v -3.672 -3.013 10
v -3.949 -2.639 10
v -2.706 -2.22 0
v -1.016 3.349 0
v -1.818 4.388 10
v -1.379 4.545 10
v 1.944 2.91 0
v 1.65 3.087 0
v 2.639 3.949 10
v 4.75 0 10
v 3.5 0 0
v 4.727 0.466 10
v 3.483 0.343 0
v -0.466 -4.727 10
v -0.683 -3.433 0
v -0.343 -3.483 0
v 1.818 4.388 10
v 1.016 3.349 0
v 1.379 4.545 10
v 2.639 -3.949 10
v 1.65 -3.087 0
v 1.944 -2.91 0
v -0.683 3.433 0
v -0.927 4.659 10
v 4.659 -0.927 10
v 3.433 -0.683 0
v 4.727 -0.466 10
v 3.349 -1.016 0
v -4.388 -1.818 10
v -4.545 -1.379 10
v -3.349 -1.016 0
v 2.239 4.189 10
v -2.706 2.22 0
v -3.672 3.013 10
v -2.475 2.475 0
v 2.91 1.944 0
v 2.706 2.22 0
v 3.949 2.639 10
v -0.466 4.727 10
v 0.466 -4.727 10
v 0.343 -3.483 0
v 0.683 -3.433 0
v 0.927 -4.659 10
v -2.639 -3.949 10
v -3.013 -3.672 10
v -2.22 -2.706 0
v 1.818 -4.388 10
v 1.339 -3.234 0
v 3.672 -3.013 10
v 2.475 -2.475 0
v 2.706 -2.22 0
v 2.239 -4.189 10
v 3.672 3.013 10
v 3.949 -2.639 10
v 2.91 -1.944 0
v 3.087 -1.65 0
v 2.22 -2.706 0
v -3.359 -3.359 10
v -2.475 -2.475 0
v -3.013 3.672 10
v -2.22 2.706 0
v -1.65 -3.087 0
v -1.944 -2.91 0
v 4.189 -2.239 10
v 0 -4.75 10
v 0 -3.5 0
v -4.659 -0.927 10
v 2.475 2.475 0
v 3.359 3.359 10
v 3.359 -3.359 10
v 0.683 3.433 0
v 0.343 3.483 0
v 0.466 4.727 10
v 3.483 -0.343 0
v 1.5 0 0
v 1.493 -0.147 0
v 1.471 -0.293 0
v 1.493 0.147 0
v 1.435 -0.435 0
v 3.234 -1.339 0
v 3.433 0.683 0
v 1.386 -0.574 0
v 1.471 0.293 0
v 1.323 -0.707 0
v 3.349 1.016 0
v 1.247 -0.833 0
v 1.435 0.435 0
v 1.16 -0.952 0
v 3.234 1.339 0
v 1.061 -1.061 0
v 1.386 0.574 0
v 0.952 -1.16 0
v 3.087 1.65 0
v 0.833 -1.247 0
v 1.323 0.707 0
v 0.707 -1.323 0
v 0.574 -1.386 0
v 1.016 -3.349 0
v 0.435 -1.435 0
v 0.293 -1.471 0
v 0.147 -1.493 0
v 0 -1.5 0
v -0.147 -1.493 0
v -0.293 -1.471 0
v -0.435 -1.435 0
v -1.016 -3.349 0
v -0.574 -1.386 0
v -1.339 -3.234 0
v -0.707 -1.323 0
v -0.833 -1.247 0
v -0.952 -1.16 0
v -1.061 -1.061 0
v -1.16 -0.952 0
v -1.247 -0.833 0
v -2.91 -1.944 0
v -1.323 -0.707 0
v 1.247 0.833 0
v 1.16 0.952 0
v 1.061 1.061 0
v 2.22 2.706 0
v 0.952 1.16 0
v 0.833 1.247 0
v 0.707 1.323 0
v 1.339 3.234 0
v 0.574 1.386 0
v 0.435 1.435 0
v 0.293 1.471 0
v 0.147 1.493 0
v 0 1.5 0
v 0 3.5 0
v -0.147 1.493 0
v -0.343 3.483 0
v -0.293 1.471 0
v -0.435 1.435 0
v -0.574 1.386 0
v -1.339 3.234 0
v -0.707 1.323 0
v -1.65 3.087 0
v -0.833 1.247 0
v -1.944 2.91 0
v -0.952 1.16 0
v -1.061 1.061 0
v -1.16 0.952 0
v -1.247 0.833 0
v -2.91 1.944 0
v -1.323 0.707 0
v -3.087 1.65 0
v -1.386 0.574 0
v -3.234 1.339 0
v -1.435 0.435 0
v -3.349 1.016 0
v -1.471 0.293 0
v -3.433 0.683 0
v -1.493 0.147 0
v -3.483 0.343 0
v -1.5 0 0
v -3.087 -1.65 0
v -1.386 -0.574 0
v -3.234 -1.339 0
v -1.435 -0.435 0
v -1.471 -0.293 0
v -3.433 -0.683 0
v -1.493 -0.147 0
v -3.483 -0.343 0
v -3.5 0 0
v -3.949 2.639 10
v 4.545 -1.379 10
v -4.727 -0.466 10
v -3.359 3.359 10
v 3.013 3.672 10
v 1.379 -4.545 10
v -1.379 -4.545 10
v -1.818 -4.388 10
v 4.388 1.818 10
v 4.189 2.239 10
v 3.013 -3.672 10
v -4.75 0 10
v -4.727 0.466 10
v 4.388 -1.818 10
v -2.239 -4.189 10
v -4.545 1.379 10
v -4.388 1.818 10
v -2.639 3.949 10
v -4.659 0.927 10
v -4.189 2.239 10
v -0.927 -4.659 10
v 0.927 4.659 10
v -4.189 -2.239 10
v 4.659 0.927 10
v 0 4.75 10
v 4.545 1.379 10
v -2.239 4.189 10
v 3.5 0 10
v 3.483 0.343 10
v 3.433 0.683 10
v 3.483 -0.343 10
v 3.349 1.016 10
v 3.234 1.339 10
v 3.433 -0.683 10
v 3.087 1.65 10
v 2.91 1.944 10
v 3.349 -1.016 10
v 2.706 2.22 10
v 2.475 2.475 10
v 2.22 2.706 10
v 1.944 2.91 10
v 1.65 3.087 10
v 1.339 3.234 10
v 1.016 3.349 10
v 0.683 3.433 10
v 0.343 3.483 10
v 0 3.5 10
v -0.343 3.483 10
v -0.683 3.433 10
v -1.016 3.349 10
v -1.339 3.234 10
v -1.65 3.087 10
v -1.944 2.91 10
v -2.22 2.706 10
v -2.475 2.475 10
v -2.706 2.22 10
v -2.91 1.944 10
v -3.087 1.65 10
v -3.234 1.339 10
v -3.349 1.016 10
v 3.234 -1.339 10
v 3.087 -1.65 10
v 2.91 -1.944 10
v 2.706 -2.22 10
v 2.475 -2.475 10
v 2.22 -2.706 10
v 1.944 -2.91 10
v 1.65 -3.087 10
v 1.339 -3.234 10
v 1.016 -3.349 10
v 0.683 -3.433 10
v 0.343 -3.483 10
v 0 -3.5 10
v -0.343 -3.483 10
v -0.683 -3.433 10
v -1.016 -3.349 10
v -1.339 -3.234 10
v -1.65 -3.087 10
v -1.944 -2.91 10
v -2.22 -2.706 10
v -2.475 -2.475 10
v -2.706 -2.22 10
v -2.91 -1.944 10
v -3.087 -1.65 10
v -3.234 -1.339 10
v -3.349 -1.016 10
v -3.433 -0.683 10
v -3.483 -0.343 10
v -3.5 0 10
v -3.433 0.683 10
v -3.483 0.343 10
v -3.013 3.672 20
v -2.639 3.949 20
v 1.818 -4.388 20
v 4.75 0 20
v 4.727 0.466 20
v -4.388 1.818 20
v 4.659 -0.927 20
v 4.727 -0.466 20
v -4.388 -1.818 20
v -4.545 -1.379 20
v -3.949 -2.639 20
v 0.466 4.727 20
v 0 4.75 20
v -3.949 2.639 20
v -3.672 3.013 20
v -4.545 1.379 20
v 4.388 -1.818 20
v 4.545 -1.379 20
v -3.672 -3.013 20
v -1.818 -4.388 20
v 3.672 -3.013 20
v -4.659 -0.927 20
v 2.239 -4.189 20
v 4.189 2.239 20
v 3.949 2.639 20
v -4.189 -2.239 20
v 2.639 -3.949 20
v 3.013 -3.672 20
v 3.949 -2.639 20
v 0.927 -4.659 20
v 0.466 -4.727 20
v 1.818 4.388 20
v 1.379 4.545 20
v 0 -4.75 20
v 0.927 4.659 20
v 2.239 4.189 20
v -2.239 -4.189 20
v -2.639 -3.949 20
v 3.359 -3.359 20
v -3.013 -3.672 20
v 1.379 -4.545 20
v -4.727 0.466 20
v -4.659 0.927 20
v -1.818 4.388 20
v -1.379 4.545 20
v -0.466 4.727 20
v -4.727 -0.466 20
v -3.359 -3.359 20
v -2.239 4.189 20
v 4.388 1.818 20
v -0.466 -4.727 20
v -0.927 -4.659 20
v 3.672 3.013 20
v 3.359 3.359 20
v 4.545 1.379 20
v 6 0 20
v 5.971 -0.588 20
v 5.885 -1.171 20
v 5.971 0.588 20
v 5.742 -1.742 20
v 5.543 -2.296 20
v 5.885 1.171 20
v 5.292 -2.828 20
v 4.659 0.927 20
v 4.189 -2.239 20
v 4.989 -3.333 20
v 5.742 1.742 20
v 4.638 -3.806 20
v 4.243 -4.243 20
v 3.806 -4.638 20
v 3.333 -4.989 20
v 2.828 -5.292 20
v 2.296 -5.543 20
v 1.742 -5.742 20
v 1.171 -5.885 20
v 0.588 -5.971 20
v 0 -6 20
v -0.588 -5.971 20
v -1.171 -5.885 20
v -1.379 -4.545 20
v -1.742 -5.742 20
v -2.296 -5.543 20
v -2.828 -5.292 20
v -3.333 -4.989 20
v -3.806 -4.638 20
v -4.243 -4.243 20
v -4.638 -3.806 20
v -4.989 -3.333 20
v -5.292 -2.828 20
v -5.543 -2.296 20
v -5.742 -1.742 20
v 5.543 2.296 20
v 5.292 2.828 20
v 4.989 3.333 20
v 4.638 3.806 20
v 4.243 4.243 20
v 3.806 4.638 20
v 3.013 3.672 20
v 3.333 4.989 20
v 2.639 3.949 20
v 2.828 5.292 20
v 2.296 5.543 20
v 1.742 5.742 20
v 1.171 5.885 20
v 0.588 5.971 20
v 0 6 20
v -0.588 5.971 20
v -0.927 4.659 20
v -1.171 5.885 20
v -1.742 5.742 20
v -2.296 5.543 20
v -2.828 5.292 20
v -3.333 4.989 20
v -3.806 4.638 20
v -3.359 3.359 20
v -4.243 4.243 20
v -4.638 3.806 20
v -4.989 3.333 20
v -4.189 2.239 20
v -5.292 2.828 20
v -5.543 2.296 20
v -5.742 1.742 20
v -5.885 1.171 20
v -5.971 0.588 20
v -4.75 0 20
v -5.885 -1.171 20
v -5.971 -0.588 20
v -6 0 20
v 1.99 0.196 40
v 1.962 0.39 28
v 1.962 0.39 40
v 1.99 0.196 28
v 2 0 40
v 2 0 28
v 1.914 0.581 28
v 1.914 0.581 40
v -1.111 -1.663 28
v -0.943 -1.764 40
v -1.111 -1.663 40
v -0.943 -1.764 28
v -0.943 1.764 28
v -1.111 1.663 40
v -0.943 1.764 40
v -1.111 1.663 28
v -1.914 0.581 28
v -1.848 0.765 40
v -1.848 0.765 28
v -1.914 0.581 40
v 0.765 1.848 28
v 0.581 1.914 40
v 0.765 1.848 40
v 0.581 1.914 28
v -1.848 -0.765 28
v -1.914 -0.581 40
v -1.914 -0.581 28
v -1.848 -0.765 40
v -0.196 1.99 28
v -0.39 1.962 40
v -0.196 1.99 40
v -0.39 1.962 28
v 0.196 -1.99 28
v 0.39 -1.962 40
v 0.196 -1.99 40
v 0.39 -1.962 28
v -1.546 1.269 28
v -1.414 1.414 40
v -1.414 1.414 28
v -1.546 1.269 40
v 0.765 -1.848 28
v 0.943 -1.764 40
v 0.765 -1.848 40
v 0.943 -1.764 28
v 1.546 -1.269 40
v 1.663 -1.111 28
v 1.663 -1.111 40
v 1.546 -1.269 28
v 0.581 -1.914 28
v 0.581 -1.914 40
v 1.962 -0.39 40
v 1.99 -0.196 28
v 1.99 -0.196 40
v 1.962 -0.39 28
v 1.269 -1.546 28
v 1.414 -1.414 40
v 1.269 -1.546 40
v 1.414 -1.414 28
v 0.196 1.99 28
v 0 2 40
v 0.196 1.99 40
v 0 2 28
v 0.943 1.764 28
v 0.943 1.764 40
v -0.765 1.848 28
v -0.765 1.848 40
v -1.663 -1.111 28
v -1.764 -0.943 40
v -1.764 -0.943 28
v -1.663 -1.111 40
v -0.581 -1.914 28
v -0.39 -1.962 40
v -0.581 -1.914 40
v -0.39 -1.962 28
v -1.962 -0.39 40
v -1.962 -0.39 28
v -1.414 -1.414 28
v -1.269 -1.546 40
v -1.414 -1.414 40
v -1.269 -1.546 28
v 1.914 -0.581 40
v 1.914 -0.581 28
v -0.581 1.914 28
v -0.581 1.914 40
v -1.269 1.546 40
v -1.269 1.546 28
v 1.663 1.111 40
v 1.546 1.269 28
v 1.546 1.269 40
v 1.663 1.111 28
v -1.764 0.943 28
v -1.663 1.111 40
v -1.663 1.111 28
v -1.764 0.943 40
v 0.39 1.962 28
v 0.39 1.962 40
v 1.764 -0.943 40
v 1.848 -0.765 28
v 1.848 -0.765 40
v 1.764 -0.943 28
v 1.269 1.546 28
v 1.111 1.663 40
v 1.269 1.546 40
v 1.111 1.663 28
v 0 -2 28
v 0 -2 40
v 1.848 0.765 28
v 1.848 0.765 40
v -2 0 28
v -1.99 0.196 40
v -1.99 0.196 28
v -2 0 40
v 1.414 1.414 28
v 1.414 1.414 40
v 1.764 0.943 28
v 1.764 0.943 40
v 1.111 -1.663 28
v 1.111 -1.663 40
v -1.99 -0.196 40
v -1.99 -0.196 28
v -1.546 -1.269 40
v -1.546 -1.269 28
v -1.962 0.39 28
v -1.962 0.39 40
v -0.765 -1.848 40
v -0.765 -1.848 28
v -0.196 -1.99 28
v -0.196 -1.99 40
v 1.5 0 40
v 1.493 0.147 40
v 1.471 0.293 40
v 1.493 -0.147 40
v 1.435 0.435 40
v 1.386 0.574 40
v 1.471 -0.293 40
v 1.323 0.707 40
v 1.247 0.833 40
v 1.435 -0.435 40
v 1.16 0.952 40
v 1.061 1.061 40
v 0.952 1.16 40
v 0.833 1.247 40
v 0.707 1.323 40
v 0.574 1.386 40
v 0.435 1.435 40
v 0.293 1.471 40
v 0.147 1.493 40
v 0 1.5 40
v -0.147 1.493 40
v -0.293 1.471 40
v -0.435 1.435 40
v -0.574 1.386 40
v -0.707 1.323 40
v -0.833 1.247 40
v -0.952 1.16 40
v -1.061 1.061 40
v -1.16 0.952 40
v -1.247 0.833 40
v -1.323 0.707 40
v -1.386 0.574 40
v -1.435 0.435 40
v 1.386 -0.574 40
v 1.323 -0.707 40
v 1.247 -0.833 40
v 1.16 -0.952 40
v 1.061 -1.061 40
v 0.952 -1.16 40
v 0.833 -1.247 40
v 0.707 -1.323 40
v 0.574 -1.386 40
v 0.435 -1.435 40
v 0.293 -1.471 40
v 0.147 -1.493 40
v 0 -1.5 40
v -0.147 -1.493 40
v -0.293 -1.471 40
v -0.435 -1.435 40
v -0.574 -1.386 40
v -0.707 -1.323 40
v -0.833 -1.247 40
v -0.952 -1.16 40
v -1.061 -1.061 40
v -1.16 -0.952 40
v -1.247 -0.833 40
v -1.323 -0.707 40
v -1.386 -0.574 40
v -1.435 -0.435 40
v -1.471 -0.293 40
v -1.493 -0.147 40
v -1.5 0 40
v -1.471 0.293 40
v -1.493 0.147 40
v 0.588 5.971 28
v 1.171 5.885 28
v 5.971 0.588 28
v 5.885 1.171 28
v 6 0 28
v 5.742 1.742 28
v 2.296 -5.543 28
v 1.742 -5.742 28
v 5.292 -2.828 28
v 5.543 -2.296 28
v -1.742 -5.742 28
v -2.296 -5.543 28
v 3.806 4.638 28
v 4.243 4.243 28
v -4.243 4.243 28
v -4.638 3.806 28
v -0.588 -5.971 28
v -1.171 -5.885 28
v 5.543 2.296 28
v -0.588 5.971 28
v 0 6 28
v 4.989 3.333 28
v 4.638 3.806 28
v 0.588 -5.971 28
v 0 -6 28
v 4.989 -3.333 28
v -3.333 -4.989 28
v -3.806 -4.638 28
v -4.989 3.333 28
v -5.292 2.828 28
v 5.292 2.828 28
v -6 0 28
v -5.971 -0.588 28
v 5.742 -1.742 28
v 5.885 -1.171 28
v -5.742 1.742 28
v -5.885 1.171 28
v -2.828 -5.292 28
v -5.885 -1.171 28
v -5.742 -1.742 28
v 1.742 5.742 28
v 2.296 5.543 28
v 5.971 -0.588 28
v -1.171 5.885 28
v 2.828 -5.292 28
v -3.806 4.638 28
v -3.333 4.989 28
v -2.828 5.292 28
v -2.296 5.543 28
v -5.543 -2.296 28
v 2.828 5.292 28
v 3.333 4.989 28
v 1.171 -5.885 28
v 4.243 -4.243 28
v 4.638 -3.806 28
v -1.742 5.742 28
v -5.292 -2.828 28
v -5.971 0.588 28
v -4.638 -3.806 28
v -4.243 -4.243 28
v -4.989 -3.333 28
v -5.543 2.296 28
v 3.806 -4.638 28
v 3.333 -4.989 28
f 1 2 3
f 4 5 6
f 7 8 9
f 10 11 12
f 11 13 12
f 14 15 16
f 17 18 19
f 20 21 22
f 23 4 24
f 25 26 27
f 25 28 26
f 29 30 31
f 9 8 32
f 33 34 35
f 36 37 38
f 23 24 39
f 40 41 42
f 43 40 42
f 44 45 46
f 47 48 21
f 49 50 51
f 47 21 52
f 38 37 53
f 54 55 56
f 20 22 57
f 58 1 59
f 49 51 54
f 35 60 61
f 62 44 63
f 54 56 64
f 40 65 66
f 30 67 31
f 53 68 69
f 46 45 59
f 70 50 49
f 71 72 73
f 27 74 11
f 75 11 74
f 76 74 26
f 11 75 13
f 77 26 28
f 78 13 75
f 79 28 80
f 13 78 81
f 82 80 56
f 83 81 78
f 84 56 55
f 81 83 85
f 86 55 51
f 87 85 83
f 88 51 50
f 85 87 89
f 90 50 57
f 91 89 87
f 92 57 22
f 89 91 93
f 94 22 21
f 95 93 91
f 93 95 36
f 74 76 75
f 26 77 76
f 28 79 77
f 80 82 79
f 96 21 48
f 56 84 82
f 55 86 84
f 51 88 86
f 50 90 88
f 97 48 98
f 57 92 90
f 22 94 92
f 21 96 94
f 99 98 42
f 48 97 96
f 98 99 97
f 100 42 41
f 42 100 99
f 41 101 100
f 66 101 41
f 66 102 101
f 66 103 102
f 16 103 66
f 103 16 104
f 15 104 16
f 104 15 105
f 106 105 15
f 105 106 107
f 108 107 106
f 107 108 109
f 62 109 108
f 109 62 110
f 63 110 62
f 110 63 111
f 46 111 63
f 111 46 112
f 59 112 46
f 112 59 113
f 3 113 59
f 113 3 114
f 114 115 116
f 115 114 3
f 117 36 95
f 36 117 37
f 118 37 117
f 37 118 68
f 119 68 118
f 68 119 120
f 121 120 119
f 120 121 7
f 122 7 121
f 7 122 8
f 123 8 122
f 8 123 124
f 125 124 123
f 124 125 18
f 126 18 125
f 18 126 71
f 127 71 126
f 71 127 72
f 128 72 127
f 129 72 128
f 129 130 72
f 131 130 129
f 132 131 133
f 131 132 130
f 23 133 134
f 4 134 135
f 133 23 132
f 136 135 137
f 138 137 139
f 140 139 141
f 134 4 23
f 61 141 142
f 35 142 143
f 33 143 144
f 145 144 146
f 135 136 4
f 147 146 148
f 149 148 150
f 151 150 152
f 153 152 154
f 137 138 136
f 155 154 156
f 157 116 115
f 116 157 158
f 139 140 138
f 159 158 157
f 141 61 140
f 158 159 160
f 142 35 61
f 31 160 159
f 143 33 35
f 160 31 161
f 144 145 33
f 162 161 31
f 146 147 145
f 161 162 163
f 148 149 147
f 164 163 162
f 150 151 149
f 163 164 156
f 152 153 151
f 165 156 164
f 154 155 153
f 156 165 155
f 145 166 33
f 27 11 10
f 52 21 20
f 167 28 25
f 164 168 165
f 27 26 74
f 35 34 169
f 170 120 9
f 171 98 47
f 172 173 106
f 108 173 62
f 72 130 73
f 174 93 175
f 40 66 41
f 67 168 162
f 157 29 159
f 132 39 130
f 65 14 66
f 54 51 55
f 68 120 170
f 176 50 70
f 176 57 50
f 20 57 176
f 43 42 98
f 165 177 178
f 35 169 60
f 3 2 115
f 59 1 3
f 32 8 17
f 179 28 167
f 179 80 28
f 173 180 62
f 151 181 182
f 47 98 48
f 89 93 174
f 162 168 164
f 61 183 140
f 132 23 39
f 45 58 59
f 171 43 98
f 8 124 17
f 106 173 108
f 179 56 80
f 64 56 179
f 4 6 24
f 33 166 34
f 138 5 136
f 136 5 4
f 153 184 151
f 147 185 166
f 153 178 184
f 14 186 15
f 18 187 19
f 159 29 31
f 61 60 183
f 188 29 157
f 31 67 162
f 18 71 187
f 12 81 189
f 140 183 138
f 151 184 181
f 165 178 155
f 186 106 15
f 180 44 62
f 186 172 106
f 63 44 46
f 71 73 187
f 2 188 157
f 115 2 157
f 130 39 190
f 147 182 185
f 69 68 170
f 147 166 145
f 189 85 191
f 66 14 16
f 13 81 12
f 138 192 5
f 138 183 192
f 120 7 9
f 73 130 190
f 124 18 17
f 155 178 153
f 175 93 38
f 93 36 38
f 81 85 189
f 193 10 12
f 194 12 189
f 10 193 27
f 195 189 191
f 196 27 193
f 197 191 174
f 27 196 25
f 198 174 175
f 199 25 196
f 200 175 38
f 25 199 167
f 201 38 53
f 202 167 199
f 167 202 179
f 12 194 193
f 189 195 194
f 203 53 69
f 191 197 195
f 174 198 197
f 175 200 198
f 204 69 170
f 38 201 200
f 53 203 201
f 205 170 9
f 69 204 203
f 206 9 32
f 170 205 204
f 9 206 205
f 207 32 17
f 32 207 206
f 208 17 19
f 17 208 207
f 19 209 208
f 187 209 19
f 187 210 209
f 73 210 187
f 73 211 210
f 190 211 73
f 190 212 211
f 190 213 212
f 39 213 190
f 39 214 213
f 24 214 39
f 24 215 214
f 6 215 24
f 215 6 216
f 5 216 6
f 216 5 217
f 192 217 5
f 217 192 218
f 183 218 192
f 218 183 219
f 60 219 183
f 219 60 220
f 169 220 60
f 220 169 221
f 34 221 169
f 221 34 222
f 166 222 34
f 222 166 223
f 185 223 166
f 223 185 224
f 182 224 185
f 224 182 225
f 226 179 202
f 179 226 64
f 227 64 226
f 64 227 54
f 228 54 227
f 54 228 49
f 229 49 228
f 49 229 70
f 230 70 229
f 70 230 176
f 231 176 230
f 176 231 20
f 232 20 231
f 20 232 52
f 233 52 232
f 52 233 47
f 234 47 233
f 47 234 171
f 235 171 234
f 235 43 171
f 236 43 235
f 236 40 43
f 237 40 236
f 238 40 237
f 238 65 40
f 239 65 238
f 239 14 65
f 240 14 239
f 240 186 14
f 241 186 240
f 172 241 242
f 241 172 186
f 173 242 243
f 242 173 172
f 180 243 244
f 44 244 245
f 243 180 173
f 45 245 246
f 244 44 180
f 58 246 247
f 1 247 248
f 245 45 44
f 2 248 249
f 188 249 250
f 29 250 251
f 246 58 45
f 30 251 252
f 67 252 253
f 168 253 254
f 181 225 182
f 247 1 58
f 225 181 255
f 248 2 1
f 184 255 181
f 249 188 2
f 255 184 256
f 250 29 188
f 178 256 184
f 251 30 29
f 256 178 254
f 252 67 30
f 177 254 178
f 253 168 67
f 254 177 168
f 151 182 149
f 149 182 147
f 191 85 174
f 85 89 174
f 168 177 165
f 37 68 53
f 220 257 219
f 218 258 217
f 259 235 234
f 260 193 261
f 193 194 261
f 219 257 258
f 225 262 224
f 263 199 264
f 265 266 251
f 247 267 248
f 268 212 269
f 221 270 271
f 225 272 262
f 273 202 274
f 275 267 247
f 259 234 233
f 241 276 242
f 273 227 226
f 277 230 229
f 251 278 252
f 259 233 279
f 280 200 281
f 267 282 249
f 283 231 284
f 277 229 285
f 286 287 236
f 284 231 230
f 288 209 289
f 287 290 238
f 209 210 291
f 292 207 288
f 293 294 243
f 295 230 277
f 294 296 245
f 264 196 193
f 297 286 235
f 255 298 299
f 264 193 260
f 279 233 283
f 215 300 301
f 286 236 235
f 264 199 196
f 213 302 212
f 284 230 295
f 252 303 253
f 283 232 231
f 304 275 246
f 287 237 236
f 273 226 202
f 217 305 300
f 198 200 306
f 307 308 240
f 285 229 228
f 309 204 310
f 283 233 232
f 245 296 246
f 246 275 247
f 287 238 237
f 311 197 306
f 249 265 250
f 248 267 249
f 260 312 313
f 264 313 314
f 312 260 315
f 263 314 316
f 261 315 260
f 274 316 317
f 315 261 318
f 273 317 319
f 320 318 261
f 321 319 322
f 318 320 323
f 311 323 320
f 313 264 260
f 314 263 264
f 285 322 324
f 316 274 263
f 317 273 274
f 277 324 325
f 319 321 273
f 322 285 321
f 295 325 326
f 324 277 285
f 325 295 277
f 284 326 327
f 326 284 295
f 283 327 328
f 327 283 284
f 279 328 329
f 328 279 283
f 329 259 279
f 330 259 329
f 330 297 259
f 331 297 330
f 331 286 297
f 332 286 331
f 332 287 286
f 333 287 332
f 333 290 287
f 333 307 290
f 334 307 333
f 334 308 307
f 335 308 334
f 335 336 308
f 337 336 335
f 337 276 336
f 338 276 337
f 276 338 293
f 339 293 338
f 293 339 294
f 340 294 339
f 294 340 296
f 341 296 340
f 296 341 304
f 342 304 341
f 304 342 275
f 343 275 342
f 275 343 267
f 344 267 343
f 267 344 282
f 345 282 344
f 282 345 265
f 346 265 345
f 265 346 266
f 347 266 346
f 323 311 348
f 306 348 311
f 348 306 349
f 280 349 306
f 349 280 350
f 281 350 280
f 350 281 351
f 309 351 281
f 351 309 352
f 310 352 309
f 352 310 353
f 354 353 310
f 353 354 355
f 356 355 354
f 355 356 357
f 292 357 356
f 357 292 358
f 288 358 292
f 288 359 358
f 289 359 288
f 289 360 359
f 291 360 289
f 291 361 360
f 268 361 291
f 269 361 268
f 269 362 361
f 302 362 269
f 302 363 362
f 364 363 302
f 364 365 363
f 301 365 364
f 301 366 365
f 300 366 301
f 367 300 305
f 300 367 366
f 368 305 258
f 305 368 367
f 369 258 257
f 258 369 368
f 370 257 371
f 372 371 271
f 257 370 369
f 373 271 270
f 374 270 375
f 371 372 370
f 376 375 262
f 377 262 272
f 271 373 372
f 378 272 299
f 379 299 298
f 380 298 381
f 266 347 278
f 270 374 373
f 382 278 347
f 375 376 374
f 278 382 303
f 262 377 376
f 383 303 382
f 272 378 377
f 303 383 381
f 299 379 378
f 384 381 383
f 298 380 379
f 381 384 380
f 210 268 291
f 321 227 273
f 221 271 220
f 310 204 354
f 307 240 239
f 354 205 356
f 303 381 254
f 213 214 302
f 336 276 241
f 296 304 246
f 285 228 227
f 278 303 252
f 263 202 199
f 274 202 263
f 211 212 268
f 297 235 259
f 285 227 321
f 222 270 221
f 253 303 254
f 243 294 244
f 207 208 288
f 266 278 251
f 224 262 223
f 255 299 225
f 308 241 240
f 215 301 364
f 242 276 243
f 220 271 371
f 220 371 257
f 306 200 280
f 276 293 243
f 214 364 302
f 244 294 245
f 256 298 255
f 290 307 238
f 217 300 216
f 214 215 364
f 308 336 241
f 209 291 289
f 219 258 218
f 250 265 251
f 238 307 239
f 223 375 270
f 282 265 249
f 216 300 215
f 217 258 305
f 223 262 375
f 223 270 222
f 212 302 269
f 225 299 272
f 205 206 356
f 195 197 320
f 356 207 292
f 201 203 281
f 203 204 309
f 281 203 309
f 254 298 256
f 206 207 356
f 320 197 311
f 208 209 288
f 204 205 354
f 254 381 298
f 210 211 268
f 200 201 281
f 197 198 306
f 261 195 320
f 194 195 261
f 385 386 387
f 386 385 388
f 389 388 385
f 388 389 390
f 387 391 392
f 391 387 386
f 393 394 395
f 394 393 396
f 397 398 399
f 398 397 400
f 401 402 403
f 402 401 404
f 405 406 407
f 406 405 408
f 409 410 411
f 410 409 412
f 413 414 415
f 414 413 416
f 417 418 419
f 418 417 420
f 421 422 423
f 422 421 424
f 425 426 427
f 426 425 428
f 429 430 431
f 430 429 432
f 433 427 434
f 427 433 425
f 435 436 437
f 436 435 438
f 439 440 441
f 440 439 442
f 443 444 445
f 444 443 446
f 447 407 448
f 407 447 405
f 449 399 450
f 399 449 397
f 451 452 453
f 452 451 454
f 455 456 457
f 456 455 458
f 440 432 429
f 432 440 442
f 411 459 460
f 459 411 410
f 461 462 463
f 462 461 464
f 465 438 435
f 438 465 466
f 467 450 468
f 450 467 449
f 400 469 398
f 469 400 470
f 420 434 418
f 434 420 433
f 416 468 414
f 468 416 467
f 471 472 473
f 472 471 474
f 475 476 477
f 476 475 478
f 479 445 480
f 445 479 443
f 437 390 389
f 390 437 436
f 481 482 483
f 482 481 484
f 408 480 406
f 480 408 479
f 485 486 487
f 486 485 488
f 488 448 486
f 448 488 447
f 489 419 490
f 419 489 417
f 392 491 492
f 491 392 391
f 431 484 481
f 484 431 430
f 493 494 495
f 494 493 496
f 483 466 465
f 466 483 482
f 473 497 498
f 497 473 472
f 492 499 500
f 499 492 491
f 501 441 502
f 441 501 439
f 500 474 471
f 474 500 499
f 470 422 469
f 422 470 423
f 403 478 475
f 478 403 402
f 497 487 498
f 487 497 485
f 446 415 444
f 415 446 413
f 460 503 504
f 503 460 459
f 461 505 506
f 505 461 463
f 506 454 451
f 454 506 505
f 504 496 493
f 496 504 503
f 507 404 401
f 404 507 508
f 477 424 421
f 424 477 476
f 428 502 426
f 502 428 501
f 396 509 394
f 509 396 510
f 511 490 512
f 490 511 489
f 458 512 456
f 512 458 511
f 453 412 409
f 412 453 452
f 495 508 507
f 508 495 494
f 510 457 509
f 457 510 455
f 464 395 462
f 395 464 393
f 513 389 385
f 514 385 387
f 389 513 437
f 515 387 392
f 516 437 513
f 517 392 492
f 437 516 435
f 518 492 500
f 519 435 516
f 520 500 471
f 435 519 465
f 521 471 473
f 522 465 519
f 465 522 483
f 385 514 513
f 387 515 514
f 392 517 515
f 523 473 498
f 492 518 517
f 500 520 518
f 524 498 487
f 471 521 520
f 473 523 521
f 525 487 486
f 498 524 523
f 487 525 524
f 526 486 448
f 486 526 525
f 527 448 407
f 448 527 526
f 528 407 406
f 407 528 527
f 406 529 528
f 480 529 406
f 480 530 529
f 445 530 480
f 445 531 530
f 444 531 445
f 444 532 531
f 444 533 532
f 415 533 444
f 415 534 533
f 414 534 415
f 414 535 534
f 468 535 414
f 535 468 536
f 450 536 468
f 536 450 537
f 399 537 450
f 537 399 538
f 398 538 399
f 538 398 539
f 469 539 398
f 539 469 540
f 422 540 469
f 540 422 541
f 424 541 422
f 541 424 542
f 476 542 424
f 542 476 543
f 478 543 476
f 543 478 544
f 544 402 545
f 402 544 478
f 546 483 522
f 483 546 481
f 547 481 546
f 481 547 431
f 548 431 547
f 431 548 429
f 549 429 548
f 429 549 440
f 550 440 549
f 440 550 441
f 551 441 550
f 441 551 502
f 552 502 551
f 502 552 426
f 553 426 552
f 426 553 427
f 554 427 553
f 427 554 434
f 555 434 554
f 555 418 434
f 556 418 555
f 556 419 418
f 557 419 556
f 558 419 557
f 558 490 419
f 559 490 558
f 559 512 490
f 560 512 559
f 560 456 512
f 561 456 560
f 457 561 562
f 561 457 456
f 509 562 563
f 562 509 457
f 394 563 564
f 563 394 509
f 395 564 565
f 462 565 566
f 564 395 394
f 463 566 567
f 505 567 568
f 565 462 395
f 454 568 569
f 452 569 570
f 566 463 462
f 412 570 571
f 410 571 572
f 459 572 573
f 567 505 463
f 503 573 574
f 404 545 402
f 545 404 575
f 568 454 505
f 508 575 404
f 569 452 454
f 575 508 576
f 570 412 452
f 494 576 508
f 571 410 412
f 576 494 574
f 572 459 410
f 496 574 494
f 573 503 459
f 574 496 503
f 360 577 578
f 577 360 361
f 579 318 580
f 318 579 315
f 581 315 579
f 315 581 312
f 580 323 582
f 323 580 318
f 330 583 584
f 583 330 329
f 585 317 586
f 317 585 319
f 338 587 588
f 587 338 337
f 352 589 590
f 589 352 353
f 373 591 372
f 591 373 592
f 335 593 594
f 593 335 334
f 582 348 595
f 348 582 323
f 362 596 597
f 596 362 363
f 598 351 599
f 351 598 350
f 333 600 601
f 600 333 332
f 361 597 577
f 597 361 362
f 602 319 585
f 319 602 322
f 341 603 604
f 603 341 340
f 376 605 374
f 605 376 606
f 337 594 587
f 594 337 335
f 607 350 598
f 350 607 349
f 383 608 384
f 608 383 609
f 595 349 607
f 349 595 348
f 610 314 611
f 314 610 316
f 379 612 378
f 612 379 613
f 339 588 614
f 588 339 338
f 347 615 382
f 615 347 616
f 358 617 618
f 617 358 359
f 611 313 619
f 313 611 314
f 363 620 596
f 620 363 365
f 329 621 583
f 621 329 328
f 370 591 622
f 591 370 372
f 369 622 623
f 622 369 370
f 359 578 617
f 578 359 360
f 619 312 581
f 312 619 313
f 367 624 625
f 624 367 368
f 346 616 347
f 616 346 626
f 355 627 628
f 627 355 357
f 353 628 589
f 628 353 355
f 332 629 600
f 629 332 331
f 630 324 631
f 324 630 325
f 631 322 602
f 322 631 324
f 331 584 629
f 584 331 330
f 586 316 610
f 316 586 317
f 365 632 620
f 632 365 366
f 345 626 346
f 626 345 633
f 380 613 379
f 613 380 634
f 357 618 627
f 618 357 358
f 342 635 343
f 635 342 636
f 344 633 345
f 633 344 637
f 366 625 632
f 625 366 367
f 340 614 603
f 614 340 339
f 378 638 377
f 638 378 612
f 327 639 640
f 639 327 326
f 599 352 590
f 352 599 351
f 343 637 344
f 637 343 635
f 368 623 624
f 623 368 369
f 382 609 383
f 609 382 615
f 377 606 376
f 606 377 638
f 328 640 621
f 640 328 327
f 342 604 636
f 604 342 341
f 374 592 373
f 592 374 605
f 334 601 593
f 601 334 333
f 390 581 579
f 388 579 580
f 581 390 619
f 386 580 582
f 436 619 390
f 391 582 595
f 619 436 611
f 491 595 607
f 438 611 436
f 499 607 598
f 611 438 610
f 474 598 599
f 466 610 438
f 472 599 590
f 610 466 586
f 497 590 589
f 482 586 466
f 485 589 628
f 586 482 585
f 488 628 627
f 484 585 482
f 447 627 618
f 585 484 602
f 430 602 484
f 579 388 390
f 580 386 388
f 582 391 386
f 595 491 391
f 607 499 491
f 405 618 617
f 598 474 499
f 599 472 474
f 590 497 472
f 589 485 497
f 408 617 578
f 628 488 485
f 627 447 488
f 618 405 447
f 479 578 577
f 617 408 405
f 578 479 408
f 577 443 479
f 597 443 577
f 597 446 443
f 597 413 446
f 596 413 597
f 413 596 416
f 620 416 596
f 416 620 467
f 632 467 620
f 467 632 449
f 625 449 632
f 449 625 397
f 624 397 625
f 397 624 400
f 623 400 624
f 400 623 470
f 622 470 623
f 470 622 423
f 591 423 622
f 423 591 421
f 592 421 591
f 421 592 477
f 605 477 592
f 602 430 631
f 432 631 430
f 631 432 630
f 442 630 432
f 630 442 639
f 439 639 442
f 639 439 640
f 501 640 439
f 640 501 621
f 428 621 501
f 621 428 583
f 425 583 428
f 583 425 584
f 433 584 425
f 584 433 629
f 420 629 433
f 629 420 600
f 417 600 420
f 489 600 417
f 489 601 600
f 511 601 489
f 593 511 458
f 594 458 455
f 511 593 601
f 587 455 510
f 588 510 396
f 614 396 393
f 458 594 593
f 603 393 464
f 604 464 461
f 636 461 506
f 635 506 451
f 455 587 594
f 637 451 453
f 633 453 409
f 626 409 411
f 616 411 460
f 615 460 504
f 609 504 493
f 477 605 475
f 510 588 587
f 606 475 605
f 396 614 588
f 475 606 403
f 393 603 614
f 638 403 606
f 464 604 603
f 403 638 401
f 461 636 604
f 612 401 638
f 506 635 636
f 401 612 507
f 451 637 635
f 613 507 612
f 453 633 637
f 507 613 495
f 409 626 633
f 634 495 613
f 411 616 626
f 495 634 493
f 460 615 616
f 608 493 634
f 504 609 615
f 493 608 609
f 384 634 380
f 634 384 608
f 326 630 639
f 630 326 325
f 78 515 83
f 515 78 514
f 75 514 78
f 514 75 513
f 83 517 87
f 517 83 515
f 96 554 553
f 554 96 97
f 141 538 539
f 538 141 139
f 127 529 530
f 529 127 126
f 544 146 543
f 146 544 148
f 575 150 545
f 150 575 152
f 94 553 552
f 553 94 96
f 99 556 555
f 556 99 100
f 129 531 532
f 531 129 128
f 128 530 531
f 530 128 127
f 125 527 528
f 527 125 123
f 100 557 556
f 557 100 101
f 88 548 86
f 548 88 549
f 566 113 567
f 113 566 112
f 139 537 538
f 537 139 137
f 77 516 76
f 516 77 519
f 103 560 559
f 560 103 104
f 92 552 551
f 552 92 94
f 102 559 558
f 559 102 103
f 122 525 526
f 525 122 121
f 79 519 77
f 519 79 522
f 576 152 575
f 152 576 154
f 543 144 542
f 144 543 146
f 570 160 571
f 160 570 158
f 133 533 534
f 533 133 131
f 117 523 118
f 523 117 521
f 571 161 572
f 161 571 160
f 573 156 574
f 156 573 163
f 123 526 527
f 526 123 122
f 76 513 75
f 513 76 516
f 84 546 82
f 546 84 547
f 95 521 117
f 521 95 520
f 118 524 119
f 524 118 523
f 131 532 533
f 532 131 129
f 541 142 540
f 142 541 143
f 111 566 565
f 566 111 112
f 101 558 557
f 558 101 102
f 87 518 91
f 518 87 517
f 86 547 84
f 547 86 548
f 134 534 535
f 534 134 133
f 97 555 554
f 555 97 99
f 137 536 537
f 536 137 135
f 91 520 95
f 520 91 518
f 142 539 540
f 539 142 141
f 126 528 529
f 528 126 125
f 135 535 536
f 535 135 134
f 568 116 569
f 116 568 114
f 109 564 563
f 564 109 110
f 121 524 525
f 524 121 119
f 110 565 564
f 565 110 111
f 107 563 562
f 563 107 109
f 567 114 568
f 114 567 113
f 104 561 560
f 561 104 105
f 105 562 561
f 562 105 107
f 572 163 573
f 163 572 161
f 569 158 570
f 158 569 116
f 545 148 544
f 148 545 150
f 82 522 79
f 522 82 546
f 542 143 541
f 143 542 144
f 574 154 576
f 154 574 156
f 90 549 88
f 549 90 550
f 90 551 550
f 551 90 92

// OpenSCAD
// Hose-barb reducer: 8 mm tubing (ID) -> 5 mm tubing (ID)
// Print orientation: standing upright along +Z

$fn = 64;

// ---- Dimensions (mm) ----
bore      = 3;    // through-bore diameter
tube_id   = 8;    // larger tubing inner diameter
tube_id2  = 5;    // smaller tubing inner diameter
barb_h    = 10;   // barb height (each, stacked 2)
barb_od   = 9.5;  // barb outer diameter at top
collar_d  = 12;   // collar diameter
len2      = 8;    // second tubing length segment
eps       = 0.5;  // overshoot for clean cuts

// ---- Model ----
difference() {
    union() {
        // Lower barbs for 8 mm tubing
        for (i = [0 : 1])
            translate([0, 0, i * barb_h])
                cylinder(h = barb_h, d1 = tube_id - 2*eps, d2 = barb_od);
        // Upper barbs for 5 mm tubing
        for (i = [0 : 1])
            translate([0, 0, 20 + i * barb_h])
                cylinder(h = barb_h, d1 = tube_id2 - 2*eps, d2 = tube_id2 - 2*eps);
        // Collar at z = 20
        translate([0, 0, 20])
            cylinder(h = len2, d = collar_d);
    }
    // Straight through-bore
    translate([0, 0, -eps])
        cylinder(h = 40 + 2*eps, d = bore);
}
